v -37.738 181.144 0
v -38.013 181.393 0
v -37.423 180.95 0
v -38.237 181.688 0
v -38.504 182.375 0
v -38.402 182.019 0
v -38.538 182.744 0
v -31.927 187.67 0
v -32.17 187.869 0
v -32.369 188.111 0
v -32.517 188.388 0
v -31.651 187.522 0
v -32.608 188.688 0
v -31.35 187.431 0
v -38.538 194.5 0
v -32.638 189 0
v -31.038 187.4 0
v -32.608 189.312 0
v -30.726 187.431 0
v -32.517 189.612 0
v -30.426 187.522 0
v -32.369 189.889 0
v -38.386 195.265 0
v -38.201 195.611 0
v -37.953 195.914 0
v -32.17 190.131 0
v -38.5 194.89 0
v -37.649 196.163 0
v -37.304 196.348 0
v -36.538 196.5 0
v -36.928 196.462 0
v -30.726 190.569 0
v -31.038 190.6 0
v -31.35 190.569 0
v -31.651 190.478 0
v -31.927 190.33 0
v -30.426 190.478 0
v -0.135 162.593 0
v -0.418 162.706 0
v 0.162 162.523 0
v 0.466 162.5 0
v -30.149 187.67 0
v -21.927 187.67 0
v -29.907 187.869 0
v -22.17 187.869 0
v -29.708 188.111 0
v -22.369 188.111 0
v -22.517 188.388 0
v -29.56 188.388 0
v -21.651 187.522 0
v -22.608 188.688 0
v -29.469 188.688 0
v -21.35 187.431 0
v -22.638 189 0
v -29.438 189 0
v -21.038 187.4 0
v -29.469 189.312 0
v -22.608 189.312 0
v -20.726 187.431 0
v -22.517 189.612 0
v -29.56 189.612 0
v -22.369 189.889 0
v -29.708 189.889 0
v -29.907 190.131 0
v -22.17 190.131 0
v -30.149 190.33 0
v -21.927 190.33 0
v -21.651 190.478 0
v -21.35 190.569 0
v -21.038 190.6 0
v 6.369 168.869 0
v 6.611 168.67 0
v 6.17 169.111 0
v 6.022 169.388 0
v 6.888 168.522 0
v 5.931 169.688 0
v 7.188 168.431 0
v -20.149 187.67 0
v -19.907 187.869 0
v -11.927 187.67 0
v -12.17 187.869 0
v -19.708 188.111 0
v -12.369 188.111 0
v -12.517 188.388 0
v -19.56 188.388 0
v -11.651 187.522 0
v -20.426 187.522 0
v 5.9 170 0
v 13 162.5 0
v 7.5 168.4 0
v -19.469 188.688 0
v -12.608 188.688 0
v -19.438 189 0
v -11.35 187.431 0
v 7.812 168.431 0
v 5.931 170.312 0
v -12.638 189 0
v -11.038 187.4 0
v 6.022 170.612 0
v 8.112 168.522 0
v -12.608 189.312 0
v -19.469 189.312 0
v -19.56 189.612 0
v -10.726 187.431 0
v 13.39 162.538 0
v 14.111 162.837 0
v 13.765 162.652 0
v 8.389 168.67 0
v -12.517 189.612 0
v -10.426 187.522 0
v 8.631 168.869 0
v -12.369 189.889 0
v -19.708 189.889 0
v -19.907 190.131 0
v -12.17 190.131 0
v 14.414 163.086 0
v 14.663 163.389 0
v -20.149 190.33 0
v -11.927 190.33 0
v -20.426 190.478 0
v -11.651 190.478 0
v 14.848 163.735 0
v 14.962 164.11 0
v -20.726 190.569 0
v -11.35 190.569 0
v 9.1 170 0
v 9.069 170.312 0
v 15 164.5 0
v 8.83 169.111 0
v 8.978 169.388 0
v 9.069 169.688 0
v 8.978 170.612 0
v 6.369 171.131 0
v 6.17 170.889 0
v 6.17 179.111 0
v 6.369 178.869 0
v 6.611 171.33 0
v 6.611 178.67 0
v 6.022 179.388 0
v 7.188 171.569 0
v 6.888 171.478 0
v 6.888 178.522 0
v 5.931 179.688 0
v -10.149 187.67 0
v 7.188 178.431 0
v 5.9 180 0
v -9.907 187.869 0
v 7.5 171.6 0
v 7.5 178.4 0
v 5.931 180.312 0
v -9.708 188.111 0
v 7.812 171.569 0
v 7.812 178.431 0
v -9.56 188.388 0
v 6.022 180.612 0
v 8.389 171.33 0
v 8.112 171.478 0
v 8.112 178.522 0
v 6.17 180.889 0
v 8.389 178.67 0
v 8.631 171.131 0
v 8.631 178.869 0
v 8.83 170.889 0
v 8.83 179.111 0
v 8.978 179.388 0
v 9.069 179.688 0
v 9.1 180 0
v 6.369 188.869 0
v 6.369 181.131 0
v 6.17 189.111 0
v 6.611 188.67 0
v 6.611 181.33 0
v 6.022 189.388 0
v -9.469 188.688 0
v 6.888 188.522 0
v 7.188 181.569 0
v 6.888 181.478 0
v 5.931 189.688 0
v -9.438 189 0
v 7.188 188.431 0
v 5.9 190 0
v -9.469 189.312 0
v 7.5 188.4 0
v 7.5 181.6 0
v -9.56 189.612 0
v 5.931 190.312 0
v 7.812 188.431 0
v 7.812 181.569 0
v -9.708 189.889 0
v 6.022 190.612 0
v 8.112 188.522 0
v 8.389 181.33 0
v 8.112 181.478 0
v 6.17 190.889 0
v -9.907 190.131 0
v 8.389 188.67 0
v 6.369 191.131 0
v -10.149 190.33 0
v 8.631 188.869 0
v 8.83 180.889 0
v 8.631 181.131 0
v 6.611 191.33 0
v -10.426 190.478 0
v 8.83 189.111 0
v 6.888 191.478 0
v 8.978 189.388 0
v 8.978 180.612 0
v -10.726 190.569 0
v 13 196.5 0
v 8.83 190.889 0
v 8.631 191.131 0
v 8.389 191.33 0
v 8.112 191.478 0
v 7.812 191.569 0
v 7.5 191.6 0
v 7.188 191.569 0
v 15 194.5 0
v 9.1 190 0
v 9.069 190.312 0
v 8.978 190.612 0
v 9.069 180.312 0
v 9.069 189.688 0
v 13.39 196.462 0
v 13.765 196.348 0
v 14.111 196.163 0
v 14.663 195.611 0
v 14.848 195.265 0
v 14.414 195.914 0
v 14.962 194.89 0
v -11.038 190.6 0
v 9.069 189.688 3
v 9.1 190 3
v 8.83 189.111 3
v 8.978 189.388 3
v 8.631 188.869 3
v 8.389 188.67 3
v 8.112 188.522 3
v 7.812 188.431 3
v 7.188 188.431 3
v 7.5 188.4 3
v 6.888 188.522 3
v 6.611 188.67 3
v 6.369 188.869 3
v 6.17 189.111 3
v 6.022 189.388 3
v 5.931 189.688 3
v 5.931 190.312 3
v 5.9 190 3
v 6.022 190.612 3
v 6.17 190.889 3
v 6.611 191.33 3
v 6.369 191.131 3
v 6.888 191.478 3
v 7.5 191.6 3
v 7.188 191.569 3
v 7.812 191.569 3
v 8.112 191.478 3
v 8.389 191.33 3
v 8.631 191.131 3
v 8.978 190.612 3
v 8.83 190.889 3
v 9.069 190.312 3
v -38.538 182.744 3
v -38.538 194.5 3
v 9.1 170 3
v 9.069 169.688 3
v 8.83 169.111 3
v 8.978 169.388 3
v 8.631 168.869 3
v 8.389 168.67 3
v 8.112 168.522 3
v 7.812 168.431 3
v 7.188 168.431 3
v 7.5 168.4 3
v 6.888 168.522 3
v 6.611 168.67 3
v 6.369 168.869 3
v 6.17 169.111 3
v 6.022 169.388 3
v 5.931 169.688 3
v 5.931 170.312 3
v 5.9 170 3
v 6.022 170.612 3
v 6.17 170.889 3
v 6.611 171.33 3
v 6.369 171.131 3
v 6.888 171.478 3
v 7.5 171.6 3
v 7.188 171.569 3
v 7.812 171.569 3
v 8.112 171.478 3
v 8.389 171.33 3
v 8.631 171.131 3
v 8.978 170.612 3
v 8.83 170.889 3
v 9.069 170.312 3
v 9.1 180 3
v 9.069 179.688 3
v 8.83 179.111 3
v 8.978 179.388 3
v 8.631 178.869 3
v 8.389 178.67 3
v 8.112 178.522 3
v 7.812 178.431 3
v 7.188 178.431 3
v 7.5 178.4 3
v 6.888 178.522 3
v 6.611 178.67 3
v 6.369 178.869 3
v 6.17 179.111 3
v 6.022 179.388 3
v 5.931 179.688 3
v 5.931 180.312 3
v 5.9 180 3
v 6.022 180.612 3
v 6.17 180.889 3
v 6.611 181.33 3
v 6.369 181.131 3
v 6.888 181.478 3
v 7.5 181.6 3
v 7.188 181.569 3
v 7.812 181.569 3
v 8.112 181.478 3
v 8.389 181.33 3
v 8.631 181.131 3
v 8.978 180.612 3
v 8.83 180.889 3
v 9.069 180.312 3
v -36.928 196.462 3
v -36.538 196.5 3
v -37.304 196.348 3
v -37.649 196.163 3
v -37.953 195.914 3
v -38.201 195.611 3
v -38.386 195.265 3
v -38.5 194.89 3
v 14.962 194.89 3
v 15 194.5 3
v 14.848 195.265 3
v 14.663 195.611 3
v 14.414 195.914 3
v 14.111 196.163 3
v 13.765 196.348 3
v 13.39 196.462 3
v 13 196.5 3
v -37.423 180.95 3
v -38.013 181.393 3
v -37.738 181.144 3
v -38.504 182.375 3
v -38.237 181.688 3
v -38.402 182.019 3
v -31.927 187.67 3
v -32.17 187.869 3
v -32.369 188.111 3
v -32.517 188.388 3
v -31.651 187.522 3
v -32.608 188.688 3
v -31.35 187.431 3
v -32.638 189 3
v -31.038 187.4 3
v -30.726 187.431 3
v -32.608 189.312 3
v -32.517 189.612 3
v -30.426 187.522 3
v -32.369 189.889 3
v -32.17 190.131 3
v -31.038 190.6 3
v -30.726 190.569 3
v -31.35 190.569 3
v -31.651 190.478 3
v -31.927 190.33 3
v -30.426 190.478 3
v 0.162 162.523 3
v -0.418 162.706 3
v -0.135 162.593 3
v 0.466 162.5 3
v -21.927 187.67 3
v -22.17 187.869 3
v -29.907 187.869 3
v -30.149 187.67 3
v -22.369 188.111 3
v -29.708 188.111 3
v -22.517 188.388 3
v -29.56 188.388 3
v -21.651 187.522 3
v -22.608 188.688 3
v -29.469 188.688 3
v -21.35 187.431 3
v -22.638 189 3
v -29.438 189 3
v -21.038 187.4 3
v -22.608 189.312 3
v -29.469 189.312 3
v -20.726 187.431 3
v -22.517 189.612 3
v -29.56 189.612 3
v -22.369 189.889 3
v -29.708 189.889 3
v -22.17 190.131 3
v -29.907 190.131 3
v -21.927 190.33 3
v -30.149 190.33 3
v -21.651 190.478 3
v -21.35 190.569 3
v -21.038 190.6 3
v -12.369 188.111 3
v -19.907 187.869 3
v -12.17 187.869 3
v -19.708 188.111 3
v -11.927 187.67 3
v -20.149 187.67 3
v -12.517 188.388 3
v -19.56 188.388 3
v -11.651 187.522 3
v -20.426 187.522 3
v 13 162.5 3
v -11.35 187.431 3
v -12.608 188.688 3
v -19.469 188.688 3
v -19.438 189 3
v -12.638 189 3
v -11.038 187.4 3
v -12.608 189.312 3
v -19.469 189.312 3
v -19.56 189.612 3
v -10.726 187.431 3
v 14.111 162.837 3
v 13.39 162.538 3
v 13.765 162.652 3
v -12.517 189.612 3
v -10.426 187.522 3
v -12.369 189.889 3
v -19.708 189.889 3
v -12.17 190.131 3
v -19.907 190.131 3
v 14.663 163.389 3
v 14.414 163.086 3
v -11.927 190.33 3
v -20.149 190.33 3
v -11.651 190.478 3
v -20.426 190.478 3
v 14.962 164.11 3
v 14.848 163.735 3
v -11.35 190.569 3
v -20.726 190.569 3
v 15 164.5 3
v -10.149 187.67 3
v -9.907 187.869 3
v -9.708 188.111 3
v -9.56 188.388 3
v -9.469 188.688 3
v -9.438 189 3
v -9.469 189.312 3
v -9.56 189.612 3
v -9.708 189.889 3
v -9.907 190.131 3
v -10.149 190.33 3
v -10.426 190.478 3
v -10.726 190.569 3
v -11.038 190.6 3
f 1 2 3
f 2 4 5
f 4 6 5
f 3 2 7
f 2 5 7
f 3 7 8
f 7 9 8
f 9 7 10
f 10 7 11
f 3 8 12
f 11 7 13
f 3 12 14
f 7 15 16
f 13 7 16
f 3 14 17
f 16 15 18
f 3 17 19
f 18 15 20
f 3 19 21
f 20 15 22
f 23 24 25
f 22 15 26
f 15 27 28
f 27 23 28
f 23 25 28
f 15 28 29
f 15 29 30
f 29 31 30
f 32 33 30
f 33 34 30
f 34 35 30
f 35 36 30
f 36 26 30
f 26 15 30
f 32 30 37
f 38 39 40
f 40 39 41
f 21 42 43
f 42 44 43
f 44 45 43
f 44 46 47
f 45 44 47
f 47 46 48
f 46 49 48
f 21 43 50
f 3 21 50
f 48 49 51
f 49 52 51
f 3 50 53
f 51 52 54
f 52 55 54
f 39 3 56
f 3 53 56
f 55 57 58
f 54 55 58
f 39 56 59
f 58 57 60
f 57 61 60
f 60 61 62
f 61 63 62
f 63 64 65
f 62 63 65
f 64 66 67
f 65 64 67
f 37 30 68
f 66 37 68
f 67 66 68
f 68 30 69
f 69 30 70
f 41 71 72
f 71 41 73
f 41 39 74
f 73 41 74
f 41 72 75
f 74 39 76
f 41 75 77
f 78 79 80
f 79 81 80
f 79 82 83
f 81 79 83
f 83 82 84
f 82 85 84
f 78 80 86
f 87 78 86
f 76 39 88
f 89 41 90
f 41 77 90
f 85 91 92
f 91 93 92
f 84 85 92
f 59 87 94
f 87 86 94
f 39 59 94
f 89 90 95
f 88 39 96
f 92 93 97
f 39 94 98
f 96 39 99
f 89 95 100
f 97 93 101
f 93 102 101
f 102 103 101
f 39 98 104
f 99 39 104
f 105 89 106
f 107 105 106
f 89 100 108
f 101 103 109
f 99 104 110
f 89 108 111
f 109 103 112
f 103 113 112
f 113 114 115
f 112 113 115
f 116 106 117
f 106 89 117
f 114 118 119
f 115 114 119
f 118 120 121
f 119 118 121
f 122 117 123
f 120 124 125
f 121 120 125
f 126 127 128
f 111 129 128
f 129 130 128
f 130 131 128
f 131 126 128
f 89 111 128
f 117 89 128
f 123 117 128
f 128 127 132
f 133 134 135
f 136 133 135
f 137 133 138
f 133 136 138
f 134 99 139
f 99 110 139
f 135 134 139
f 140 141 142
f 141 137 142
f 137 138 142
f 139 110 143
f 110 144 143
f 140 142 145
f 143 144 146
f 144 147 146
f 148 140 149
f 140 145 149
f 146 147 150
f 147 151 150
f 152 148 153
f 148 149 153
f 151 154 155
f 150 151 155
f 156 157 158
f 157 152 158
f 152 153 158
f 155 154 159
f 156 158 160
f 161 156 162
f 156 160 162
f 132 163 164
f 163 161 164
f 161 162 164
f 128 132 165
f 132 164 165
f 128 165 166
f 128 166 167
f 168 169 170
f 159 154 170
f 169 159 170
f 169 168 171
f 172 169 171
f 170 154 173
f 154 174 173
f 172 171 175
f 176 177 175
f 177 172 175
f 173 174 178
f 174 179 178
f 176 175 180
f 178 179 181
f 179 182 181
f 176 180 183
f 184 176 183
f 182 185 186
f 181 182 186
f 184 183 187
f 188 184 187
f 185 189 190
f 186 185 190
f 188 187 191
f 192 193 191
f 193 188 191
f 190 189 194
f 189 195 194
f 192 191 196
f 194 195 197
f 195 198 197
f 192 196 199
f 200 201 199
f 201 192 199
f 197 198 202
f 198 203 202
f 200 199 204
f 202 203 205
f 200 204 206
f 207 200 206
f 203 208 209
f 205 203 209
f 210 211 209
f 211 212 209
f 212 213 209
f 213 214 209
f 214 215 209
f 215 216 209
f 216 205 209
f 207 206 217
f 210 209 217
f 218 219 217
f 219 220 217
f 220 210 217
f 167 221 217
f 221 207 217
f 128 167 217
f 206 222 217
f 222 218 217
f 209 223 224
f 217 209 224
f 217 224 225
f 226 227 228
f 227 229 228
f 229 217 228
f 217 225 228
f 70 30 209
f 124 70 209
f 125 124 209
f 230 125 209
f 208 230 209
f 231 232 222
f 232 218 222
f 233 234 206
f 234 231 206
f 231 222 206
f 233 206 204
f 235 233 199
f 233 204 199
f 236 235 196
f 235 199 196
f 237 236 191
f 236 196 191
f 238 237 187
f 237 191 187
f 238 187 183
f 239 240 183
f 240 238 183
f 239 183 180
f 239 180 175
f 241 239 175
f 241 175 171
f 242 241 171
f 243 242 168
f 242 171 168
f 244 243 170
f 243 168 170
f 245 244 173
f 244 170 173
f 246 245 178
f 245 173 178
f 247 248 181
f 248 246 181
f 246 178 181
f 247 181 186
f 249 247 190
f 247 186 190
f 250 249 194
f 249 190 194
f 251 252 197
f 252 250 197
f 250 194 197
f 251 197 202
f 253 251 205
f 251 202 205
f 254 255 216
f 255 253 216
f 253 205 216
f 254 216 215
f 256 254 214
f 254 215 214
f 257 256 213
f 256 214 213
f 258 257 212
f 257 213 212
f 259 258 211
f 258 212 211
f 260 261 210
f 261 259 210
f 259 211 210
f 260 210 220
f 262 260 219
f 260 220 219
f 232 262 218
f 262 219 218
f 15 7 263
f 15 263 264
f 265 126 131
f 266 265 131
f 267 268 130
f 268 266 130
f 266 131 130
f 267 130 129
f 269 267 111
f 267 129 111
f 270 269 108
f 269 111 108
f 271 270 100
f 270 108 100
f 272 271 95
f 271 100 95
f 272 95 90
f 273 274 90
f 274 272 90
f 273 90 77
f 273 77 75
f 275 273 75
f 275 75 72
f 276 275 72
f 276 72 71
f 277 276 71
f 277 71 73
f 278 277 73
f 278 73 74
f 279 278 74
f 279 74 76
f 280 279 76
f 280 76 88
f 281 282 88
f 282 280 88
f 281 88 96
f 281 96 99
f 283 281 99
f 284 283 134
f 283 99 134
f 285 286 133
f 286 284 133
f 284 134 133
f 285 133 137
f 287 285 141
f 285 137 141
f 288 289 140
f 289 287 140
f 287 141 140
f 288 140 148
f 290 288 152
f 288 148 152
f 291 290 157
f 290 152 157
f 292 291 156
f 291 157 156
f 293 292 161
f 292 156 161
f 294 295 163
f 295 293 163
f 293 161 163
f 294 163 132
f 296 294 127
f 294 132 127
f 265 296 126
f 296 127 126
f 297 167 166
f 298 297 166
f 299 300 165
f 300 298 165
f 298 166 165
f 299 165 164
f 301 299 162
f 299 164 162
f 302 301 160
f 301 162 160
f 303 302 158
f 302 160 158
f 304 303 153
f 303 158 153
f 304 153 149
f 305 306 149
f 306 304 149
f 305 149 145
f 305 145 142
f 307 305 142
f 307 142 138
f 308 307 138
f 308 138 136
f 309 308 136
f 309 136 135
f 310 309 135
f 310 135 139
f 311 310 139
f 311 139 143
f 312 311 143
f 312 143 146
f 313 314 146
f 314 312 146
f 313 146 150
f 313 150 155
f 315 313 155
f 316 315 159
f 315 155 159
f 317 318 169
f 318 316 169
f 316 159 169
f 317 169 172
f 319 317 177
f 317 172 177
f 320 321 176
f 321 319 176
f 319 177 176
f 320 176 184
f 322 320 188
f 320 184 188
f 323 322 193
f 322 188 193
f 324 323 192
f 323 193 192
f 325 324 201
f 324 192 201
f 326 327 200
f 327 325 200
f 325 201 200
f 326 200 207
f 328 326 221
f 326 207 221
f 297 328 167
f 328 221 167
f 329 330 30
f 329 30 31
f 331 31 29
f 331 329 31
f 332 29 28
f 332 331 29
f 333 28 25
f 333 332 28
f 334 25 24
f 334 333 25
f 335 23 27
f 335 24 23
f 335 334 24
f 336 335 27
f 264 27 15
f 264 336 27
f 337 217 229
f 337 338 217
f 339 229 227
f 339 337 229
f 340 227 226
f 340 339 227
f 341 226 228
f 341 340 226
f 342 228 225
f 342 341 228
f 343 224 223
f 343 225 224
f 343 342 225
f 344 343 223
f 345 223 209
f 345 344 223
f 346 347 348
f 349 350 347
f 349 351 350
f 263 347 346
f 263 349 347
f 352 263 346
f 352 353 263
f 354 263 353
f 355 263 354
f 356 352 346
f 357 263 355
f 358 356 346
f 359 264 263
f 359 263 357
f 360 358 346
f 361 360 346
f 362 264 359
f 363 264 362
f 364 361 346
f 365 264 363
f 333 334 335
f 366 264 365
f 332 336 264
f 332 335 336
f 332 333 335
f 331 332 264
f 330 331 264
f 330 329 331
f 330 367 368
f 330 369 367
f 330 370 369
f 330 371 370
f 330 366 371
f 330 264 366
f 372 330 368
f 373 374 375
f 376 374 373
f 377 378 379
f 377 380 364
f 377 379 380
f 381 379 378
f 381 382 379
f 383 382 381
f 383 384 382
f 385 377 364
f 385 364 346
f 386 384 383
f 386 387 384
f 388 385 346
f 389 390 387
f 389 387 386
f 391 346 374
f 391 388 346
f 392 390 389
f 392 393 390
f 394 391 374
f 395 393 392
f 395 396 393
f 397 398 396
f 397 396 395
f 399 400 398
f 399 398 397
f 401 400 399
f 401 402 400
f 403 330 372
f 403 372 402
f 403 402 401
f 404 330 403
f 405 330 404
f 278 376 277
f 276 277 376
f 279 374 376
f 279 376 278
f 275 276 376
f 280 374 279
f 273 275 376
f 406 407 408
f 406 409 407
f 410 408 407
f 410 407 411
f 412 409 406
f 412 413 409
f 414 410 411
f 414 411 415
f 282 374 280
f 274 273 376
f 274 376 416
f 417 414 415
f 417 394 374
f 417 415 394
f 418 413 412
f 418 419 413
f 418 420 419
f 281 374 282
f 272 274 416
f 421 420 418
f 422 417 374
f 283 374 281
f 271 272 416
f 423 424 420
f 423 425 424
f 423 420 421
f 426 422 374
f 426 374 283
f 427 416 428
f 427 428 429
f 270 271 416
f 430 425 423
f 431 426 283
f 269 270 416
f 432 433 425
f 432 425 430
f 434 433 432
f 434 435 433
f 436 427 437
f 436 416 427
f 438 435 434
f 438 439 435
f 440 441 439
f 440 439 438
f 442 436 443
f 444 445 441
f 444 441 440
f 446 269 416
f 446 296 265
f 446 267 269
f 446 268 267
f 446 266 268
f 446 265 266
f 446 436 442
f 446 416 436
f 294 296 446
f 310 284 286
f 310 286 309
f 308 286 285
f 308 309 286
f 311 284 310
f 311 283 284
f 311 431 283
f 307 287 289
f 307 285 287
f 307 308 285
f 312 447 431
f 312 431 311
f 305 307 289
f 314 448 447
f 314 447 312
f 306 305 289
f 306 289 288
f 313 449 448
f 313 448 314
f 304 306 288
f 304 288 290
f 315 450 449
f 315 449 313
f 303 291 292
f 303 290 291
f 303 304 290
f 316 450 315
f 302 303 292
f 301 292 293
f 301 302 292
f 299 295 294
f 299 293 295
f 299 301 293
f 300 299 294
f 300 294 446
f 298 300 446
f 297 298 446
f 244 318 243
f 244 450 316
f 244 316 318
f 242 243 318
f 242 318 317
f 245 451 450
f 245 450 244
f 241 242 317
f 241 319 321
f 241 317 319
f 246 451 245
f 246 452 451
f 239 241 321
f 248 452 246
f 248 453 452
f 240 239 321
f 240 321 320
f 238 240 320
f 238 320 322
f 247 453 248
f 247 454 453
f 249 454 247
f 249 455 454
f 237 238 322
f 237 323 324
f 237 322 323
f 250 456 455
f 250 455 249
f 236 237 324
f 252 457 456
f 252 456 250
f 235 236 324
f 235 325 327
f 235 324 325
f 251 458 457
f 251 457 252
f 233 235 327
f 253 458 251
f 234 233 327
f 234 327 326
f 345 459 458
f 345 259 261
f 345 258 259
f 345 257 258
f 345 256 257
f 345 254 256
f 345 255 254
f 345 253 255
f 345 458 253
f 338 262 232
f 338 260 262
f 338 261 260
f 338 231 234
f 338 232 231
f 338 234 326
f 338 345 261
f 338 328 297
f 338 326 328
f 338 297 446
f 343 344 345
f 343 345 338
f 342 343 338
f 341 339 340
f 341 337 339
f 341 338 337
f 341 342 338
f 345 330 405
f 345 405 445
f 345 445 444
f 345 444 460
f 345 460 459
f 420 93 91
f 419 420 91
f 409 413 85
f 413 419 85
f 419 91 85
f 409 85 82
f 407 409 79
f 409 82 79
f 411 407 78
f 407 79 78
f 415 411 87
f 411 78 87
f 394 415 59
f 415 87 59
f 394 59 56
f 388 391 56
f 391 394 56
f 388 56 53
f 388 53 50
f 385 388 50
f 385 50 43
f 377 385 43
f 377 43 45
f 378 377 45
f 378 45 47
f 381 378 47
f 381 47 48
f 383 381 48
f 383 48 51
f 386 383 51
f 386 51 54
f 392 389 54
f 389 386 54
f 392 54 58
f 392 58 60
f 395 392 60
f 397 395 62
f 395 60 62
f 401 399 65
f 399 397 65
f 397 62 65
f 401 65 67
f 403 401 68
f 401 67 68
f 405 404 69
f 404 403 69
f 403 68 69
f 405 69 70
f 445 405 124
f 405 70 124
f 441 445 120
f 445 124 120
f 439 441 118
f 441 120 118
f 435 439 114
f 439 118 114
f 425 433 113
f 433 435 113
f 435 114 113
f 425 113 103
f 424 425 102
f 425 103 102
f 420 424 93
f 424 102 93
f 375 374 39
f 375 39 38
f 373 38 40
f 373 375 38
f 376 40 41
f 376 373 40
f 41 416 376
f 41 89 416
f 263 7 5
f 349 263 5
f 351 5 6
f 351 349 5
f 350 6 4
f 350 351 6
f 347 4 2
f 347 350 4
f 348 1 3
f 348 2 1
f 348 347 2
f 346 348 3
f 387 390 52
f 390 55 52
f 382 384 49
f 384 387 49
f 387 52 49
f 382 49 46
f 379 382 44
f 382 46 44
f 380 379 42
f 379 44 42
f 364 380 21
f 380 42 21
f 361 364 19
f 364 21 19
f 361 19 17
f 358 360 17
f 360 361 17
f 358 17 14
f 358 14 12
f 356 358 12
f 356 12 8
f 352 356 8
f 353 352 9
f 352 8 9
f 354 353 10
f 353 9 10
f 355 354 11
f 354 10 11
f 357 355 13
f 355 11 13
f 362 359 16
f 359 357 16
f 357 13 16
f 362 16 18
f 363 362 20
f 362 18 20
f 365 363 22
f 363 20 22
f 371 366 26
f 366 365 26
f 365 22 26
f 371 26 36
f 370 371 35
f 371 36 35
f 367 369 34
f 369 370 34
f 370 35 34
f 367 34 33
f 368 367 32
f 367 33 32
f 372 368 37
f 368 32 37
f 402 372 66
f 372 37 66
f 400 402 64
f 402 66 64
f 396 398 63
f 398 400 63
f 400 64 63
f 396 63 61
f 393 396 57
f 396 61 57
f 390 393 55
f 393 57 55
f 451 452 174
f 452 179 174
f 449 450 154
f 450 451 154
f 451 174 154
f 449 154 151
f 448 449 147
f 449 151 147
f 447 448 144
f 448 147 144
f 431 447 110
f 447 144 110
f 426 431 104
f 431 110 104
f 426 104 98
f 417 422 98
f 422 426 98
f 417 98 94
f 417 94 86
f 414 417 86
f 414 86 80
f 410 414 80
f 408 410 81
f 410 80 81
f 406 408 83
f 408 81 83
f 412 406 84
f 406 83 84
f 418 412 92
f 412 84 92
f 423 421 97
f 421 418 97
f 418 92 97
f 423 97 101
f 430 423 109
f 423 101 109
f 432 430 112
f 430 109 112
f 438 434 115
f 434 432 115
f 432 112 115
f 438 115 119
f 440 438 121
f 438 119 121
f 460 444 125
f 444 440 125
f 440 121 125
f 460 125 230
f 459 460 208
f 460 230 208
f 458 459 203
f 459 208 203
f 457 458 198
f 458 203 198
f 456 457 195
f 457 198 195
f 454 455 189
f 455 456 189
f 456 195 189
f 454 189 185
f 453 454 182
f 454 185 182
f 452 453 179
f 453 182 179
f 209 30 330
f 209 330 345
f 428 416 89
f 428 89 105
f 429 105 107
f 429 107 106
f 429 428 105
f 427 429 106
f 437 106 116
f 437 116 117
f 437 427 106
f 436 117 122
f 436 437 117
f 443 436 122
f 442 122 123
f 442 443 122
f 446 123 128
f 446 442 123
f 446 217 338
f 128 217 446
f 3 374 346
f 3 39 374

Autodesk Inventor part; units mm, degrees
ref_plane "YZ Plane" through (0, 0, 0) normal (1, 0, 0) x (0, 1, 0)
ref_plane "XZ Plane" through (0, 0, 0) normal (0, 1, 0) x (-1, 0, 0)
ref_plane "作業平面1" through (0, 0, 0) normal (0, 0, 1) x (1, 0, 0)
sketch "スケッチ1" plane through (0, 0, 0) normal (0, 0, 1) x (1, 0, 0)
  circle A0 centre (7.5, 170) radius 1.6 projected
  circle A1 centre (7.5, 180) radius 1.6 projected
  circle A2 centre (7.5, 190) radius 1.6 projected
  circle A3 centre (-11.0383, 189) radius 1.6 projected
  circle A4 centre (-21.0383, 189) radius 1.6 projected
  circle A5 centre (-31.0383, 189) radius 1.6 projected
  line L0 (15, 162.5) -> (0, 162.5)
  line L1 (0, 162.5) -> (-38.5383, 181.5)
  line L2 (-38.5383, 181.5) -> (-38.5383, 196.5)
  line L3 (-38.5383, 196.5) -> (15, 196.5)
  line L4 (15, 196.5) -> (15, 162.5)
  point P0 (0, 0)
  dimension "d0" = 7.5
  dimension "d1" = 7.5
  dimension "d2" = 7.5
  dimension "d3" = 7.5
  dimension "d4" = 7.5
  dimension "d5" = 7.5
extrude "押し出し1" add sketch "スケッチ1" along normal blind 3
fillet "フィレット1" radius 2 5 edges at (15, 162.5, 1.5) (15, 196.5, 1.5) (-38.5383, 196.5, 1.5) (-38.5383, 181.5, 1.5) (0, 162.5, 1.5)
properties part number "オムニ_koteigu" material "アルミニウム 6061"
